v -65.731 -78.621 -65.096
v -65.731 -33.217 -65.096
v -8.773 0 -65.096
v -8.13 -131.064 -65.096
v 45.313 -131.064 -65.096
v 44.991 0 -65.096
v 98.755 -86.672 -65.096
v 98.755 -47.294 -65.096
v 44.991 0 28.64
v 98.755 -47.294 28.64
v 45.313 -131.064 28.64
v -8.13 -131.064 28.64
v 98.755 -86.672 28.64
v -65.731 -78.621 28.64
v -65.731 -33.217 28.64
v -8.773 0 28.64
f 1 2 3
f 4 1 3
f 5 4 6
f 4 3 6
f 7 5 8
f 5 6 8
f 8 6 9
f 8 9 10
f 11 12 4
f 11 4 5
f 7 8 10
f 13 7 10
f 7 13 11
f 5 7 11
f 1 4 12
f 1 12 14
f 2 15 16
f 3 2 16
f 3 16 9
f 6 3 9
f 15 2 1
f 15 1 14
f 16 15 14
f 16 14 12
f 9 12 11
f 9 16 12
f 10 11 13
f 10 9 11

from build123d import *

# Parameters (mm, degrees)
F0_W     = 164.485968
F0_H     = 93.735796
F1_DEPTH = 131.064
F3_DEPTH = 109.474
F5_DEPTH = 175.768
F7_DEPTH = 175.514
F9_DEPTH = 113.538


with BuildPart() as f1:
    # F0 (on Front) → F1 (new body)
    with BuildSketch(Plane.XZ):
        with Locations((16.512107, -18.227907)):
            Rectangle(F0_W, F0_H)
    extrude(amount=F1_DEPTH)

    # F2 (on face) → F3 (cut)
    with BuildSketch(Plane.XY.offset(28.639991)):
        Polygon((-8.129642, -131.064), (-65.730877, -78.621335), (-65.730877, -131.064), align=None)
    extrude(amount=-F3_DEPTH, mode=Mode.SUBTRACT)

    # F4 (on face) → F5 (cut)
    with BuildSketch(Plane.XY.offset(28.639991)):
        Polygon((-65.730877, 0), (-65.730877, -33.21651), (-19.07178, 0), align=None)
    extrude(amount=-F5_DEPTH, mode=Mode.SUBTRACT)

    # F6 (on face) → F7 (cut)
    with BuildSketch(Plane.XY.offset(28.639991)):
        Polygon((-65.730877, -33.21651), (-8.77298, 0), (-19.07178, 0), align=None)
    extrude(amount=-F7_DEPTH, mode=Mode.SUBTRACT)

    # F8 (on face) → F9 (cut)
    with BuildSketch(Plane.XY.offset(28.639991)):
        Polygon((98.755091, 0), (44.991056, 0), (98.755091, -47.293574), align=None)
        Polygon((98.755091, -131.064), (98.755091, -86.671993), (45.312725, -131.064), align=None)
    extrude(amount=-F9_DEPTH, mode=Mode.SUBTRACT)


solid = f1.part
